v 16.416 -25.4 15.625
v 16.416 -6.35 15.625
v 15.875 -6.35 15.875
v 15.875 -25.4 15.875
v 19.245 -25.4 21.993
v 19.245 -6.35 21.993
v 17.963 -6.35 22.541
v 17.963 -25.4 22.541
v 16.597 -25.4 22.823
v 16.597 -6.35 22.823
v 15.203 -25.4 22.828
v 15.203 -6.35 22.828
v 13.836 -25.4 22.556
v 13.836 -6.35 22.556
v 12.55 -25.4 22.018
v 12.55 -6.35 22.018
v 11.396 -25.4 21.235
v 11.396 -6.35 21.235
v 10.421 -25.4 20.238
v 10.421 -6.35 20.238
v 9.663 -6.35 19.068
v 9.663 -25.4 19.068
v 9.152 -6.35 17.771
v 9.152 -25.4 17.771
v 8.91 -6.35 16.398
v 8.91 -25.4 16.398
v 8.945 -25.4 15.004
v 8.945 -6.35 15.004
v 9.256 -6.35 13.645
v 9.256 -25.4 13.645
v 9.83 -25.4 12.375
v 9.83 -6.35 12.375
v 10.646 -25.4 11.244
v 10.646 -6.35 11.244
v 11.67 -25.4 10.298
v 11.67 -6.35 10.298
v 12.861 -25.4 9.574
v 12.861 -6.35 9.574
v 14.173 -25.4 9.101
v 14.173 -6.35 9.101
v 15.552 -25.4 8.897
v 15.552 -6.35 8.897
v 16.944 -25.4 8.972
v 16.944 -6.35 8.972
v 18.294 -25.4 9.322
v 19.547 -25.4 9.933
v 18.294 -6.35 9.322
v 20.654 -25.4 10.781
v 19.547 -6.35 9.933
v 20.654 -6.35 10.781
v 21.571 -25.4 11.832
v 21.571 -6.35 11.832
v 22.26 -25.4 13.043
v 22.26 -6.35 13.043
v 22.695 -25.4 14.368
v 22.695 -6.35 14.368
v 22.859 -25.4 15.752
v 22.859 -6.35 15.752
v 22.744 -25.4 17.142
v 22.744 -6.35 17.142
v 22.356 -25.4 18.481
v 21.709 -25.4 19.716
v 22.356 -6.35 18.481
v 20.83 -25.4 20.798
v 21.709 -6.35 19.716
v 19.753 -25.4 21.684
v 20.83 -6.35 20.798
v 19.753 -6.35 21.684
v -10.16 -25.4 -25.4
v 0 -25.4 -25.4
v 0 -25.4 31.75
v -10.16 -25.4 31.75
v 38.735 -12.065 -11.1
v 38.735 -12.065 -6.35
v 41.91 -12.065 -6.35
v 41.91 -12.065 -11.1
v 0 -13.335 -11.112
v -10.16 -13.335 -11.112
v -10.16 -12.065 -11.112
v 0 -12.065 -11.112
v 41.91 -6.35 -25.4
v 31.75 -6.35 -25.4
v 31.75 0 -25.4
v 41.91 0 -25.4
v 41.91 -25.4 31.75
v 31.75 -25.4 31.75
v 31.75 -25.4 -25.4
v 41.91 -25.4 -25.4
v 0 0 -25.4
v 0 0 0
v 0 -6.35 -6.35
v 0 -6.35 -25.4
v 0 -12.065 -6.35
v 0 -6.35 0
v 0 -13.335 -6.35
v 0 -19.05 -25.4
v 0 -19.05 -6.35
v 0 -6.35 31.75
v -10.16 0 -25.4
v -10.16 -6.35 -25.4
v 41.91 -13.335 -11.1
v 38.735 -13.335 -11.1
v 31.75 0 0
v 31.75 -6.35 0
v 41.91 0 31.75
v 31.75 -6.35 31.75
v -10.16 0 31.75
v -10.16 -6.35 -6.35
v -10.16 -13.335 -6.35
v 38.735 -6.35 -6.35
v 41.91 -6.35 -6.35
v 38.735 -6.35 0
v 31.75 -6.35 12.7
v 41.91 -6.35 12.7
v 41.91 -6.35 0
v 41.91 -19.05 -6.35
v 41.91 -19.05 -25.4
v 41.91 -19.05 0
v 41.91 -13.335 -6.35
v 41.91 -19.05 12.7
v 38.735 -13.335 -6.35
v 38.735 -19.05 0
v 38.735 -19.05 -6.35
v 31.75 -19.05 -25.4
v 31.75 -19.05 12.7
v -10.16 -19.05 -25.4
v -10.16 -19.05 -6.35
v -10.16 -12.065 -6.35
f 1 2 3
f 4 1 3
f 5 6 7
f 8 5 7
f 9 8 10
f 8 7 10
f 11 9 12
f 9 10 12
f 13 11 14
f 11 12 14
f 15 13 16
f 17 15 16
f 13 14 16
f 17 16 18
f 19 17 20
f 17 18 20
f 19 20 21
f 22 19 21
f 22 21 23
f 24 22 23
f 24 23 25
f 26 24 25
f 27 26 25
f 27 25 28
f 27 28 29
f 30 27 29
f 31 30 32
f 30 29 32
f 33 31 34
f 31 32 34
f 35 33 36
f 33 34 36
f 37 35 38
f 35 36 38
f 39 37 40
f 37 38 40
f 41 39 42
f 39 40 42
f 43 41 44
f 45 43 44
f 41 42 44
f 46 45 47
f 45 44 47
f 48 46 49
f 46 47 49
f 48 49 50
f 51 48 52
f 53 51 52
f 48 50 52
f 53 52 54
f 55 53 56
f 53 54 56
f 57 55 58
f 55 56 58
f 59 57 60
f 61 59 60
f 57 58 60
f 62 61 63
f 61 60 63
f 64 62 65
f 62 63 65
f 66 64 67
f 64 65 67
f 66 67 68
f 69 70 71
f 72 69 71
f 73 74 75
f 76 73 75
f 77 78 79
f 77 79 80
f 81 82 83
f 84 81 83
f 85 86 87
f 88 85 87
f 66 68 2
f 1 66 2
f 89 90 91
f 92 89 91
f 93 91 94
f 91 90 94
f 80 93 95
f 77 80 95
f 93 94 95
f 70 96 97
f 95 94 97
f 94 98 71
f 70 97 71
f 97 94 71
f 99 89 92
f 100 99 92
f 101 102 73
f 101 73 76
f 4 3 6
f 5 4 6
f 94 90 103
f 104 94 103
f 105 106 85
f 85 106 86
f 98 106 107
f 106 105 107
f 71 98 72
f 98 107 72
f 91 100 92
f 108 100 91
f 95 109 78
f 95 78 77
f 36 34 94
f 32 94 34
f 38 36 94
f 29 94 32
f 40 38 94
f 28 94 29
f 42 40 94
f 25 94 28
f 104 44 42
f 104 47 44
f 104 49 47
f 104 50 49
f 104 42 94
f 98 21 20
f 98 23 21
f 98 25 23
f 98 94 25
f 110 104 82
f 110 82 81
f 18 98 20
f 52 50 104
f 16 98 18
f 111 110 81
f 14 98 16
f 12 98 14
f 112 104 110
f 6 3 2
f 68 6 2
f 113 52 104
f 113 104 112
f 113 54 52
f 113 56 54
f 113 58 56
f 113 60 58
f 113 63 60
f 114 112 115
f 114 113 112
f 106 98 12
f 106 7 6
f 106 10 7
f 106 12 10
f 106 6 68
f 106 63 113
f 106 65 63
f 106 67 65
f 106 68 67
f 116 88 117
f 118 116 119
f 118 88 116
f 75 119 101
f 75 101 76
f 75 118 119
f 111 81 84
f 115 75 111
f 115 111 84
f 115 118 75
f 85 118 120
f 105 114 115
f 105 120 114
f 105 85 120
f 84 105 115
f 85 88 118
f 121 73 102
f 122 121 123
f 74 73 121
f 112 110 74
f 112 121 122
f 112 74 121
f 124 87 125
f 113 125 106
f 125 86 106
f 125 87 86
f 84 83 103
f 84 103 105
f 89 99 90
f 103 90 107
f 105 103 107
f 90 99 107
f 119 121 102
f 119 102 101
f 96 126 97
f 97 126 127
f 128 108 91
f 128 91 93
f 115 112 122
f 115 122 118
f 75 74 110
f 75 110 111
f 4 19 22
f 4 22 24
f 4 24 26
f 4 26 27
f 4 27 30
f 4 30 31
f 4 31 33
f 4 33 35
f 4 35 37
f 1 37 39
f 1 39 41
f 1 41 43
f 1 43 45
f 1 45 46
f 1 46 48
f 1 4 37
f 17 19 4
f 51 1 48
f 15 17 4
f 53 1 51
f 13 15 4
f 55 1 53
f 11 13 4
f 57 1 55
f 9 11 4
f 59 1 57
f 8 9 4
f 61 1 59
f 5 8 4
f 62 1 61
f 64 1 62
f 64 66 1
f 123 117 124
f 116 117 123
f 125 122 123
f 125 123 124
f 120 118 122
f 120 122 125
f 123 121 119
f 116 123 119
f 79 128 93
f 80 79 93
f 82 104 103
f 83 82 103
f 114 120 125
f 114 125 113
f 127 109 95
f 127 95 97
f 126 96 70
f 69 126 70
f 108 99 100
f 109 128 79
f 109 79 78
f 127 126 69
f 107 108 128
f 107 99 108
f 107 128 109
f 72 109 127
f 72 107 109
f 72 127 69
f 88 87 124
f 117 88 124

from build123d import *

# Parameters (mm, degrees)
F0_W      = 31.75
F0_H      = 31.75
F1_DEPTH  = 6.35
F2_W      = 6.35
F2_H      = 31.75
F3_DEPTH  = 10.16
F4_W      = 6.35
F4_H      = 31.75
F5_DEPTH  = 10.16
F6_W      = 12.7
F6_H      = 38.1
F7_DEPTH  = 12.7
F8_W      = 3.175
F8_H      = 6.35
F9_DEPTH  = 12.7
F10_W     = 12.7
F10_H     = 19.05
F11_DEPTH = 12.7
F13_W     = 10.16
F13_H     = 1.27
F14_DEPTH = 4.7625
F16_DEPTH = 19.05
F17_W     = 3.175
F17_H     = 1.27
F18_DEPTH = 4.7498


with BuildPart() as f1:
    # F0 (on Front) → F1 (new body)
    with BuildSketch(Plane.XZ):
        with Locations((15.875, 15.875)):
            Rectangle(F0_W, F0_H)
    extrude(amount=F1_DEPTH)

    # F2 (on face) → F3 (join)
    with BuildSketch(Plane(origin=(0, 0, 0), x_dir=(0, -1, 0), z_dir=(-1, 0, 0))):
        Polygon((0, 0), (0, -25.4), (25.4, -25.4), (25.4, 31.75), (6.35, 31.75), (6.35, 0), align=None)
        with Locations((3.175, 15.875)):
            Rectangle(F2_W, F2_H)
    extrude(amount=F3_DEPTH)

    # F4 (on face) → F5 (join)
    with BuildSketch(Plane.YZ.offset(31.75)):
        with Locations((-3.175, 15.875)):
            Rectangle(F4_W, F4_H)
        Polygon((-6.35, 0), (-6.35, 31.75), (-25.4, 31.75), (-25.4, -25.4), (0, -25.4), (0, 0), align=None)
    extrude(amount=F5_DEPTH)

    # F6 (on face) → F7 (cut)
    with BuildSketch(Plane.YZ.offset(41.91)):
        with Locations((-12.7, -6.35)):
            Rectangle(F6_W, F6_H)
    extrude(amount=-F7_DEPTH, mode=Mode.SUBTRACT)

    # F8 (on face) → F9 (join, through all)
    with BuildSketch(Plane.XZ.offset(6.35)):
        with Locations((40.3225, -3.175)):
            Rectangle(F8_W, F8_H)
    extrude(amount=F9_DEPTH)

    # F10 (on face) → F11 (cut)
    with BuildSketch(Plane(origin=(-10.16, 0, 0), x_dir=(0, -1, 0), z_dir=(-1, 0, 0))):
        with Locations((12.7, -15.875)):
            Rectangle(F10_W, F10_H)
    extrude(amount=-F11_DEPTH, mode=Mode.SUBTRACT)

    # F13 (on face) → F14 (join)
    with BuildSketch(Plane(origin=(0, 0, -6.35), x_dir=(1, 0, 0), z_dir=(0, 0, -1))):
        with Locations((-5.08, 12.7)):
            Rectangle(F13_W, F13_H)
    extrude(amount=F14_DEPTH)

    # F15 (on face) → F16 (join)
    with BuildSketch(Plane.XZ.offset(6.35)):
        with BuildLine():
            Line((16.4158089086, 15.6251635376), (15.875, 15.875))
            Line((15.875, 15.875), (19.2451557873, 21.9931921324))
            ThreePointArc((19.2451557873, 21.9931921324), (12.2474155401, 9.9058412664), (19.7534345525, 21.6843003384))
            Line((19.7534345525, 21.6843003384), (16.4158089086, 15.6251635376))
        make_face()
    extrude(amount=F16_DEPTH)

    # F17 (on face) → F18 (join)
    with BuildSketch(Plane(origin=(0, 0, -6.35), x_dir=(1, 0, 0), z_dir=(0, 0, -1))):
        with Locations((40.3225, 12.7)):
            Rectangle(F17_W, F17_H)
    extrude(amount=F18_DEPTH)


solid = f1.part
